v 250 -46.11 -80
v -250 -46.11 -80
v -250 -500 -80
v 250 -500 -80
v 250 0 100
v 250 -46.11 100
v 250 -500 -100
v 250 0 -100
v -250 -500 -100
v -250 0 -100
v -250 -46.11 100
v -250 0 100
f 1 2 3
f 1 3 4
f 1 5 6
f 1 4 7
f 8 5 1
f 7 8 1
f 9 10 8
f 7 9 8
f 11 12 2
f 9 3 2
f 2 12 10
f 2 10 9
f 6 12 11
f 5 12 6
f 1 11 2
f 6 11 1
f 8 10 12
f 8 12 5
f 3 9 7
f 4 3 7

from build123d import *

# Parameters (mm, degrees)
SKETCH1_W           = 500
SKETCH1_H           = 200
BOSS_EXTRUDE1_DEPTH = 500
SKETCH2_W           = 500
SKETCH2_H           = 453.889764575
CUT_EXTRUDE1_DEPTH  = 180


with BuildPart() as part:
    # Sketch1 → Boss-Extrude1 (new body)
    with BuildSketch(Plane(origin=(0, 0, 0), x_dir=(1, 0, 0), z_dir=(0, 1, 0))):
        Rectangle(SKETCH1_W, SKETCH1_H)
    extrude(amount=-BOSS_EXTRUDE1_DEPTH)

    # Sketch2 → Cut-Extrude1 (cut)
    with BuildSketch(Plane.XY.offset(100)):
        with Locations((0, -273.055117713)):
            Rectangle(SKETCH2_W, SKETCH2_H)
    extrude(amount=-CUT_EXTRUDE1_DEPTH, mode=Mode.SUBTRACT)


solid = part.part
